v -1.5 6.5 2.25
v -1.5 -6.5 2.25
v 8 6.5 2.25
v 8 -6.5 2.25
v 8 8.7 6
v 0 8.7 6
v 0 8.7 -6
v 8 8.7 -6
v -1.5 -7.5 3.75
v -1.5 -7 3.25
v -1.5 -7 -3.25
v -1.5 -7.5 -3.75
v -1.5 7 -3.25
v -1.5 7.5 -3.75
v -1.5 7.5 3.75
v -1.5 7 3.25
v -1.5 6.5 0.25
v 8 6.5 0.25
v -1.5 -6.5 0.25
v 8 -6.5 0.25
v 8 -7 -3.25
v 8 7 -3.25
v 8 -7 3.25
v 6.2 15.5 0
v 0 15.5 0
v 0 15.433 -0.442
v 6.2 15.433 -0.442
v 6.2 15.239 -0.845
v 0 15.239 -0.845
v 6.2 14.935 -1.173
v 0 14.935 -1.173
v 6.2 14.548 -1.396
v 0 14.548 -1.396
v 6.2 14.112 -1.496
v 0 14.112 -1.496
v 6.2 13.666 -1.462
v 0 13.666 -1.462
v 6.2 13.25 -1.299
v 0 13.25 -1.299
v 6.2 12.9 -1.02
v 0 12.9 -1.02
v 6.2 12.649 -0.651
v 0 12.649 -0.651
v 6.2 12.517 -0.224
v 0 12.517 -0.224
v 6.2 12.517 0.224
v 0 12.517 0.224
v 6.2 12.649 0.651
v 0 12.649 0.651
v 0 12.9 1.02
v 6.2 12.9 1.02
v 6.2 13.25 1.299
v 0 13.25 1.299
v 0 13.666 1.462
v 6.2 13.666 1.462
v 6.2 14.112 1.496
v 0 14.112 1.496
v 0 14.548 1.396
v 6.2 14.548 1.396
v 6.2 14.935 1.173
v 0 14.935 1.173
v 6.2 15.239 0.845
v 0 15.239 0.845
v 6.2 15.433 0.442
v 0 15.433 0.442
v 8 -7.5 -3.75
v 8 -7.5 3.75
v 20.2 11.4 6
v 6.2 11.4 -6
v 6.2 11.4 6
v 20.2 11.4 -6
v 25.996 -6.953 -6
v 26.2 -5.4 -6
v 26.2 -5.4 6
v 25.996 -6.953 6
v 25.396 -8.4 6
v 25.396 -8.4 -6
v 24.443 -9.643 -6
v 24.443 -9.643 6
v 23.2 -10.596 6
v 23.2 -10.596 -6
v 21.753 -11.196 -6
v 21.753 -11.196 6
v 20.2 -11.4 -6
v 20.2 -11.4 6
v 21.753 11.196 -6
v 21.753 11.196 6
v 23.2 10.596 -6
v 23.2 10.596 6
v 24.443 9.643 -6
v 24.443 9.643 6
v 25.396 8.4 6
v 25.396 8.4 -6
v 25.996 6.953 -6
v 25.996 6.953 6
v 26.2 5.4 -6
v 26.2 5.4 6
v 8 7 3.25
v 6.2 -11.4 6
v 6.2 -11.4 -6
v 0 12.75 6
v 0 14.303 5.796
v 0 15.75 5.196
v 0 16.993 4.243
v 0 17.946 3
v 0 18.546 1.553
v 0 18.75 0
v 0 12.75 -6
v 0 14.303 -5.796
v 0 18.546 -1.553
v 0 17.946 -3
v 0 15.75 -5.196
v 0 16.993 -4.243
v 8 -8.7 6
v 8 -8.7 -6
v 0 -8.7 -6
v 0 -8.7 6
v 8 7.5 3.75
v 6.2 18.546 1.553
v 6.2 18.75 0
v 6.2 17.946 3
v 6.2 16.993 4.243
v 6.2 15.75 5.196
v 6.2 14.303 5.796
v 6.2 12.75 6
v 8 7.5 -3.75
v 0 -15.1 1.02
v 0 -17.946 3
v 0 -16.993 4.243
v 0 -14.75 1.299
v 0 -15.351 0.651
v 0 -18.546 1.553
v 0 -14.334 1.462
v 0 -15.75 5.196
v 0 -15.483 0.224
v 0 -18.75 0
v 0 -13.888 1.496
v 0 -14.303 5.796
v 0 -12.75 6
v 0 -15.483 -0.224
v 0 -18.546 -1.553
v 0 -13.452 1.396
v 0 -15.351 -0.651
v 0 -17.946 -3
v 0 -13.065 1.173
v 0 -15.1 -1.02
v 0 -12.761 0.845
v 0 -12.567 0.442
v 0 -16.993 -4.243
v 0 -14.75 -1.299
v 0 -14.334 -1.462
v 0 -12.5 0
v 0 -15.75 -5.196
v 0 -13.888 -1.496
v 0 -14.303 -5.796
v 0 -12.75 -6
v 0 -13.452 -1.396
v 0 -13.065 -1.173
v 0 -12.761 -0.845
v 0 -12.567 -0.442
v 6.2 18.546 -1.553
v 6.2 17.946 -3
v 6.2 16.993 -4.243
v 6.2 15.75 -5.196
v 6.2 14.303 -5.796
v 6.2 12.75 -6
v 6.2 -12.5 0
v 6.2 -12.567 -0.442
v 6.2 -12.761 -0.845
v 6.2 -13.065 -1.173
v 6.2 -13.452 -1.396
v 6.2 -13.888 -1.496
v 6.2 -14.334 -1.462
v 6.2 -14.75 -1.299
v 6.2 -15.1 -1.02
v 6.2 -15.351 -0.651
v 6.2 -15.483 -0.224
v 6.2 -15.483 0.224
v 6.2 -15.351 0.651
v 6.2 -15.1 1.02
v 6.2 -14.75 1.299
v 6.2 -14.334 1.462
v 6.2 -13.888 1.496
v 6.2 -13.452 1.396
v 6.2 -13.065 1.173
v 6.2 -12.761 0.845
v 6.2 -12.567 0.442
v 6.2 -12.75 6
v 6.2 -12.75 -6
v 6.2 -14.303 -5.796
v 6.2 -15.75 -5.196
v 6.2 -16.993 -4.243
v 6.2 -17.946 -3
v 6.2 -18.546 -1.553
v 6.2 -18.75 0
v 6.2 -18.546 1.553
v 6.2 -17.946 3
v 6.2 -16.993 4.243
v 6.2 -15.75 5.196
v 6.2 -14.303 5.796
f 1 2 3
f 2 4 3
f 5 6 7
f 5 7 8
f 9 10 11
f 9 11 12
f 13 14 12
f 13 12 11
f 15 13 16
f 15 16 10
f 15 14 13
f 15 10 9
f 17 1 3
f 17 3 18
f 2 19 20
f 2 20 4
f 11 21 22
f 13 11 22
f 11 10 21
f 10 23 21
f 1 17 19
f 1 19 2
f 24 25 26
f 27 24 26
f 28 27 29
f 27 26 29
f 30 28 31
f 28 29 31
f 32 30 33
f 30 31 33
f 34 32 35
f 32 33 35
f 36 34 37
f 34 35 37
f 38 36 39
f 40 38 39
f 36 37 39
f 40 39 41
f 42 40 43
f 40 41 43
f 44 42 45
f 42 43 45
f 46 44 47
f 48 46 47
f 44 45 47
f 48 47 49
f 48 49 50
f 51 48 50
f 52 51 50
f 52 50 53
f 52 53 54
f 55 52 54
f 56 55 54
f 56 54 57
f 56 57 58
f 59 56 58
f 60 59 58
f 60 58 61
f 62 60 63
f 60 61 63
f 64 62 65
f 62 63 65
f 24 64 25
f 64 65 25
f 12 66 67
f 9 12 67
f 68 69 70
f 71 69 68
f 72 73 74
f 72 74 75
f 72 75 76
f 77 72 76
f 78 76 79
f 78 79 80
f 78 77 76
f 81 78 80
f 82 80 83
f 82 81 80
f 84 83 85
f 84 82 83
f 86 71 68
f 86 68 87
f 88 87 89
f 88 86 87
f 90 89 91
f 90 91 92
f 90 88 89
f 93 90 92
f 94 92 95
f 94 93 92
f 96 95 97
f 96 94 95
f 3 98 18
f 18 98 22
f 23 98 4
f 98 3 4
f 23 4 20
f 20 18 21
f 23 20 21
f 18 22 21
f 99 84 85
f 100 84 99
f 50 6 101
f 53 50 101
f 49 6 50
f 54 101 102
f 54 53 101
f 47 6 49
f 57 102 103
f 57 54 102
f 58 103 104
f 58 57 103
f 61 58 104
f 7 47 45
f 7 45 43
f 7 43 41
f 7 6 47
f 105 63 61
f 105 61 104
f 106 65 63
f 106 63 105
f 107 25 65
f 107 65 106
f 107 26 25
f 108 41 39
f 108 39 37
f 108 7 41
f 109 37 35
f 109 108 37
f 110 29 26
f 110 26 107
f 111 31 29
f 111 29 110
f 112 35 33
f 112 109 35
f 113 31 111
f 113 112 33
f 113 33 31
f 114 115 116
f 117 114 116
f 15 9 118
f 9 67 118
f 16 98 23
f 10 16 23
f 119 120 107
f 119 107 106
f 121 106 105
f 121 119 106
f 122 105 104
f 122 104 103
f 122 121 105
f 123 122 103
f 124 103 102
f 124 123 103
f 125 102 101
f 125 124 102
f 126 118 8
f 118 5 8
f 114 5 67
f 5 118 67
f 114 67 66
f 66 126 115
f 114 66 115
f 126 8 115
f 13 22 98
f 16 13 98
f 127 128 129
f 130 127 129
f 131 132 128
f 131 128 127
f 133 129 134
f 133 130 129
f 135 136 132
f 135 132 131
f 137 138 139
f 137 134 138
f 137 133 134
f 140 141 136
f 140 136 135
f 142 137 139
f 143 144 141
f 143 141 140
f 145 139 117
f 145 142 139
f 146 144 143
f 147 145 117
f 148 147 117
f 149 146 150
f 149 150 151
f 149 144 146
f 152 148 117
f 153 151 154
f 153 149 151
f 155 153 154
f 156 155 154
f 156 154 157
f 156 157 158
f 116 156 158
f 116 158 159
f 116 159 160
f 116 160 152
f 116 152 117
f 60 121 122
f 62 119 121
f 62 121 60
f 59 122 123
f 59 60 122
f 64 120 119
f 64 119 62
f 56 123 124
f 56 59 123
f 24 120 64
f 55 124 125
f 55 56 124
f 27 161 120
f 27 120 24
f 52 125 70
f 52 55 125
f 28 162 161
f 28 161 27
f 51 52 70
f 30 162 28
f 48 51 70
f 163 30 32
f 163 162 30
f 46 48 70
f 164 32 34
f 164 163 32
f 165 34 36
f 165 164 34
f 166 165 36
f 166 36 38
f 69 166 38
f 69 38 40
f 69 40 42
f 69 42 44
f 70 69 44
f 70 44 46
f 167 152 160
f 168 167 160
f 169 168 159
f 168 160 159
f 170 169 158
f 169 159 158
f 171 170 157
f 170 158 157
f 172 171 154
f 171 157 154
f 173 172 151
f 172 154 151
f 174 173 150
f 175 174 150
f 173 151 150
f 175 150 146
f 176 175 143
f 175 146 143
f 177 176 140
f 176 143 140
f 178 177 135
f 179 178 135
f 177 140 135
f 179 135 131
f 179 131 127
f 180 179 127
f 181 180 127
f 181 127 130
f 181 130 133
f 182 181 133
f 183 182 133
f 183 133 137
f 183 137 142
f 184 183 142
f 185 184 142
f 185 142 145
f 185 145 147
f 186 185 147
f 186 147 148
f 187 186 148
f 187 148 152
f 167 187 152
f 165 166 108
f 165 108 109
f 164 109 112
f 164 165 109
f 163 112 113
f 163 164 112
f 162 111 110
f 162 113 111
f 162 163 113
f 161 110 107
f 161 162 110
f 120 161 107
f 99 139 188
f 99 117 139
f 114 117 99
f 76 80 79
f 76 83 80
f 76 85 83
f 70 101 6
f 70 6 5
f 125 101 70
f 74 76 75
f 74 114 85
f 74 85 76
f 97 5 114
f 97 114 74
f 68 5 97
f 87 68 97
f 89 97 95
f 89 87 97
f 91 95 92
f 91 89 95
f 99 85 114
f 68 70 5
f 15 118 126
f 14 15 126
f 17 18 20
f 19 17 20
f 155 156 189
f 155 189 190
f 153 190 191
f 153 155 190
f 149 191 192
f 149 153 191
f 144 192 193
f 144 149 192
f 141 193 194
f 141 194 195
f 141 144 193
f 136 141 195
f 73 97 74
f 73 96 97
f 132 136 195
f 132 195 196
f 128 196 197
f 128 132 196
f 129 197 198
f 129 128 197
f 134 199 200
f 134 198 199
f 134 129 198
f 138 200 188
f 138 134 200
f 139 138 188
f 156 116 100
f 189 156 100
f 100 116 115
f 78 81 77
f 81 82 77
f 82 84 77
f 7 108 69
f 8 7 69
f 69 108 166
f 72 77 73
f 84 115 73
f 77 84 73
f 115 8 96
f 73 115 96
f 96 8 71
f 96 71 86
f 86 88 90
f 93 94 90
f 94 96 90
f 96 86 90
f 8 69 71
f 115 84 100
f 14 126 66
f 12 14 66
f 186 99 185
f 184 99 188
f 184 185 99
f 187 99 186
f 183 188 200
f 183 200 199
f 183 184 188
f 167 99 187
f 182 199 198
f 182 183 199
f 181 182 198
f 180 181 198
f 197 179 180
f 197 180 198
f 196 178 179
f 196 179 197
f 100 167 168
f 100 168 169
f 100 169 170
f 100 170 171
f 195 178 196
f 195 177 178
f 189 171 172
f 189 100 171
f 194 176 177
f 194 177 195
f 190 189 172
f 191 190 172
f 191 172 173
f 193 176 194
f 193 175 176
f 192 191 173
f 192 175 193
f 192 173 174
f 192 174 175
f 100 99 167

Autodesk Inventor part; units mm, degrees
ref_plane "YZ Plane" through (0, 0, 0) normal (1, 0, 0) x (0, 1, 0)
ref_plane "XZ Plane" through (0, 0, 0) normal (0, 1, 0) x (-1, 0, 0)
ref_plane "XY Plane" through (0, 0, 0) normal (0, 0, 1) x (1, 0, 0)
sketch "Sketch1" plane through (0, 0, 0) normal (0, 0, 1) x (1, 0, 0)
  line L0 (0, 18.75) -> (6.2, 18.75)
  line L1 (6.2, -18.75) -> (0, -18.75)
  line L2 (0, -18.75) -> (0, 18.75)
  line L3 (0, 8.7) -> (8, 8.7)
  line L4 (8, 8.7) -> (8, -8.7)
  line L5 (8, -8.7) -> (0, -8.7)
  line L6 (0, -8.7) -> (0, 8.7)
  line L7 (6.2, 11.4) -> (26.2, 11.4)
  line L8 (26.2, 11.4) -> (26.2, -11.4)
  line L9 (26.2, -11.4) -> (6.2, -11.4)
  line L10 (6.2, 18.75) -> (6.2, 11.4)
  line L11 (6.2, -11.4) -> (6.2, -18.75)
  line L12 (6.2, 11.4) -> (6.2, -11.4) construction
  line L13 (0, 0) -> (26.2, 0) construction
  point P0 (6.2, 0)
  dimension "d0" = 37.5
  dimension "d1" = 6.2
  dimension "d2" = 17.4
  dimension "d3" = 8
  dimension "d4" = 20
  dimension "d5" = 22.8
extrude "Extrusion1" add sketch "Sketch1" along normal mid plane 12 contours L0 L10 L7 L8 L9 L11 L1 L2 L5 L4 L3
sketch "Sketch2" plane through (0, 0, 0) normal (1, 0, 0) x (0, 1, 0)
  line L0 (14, 0) -> (-14, 0) construction
  circle A0 centre (14, 0) radius 1.5
  circle A1 centre (-14, 0) radius 1.5
  point P0 (0, 0)
  point P1 (0, 0)
  dimension "d8" = 28
  dimension "d9" = 3
extrude "Extrusion2" cut sketch "Sketch2" along normal through all
sketch "Sketch3" plane through (8, -8.7, -6) normal (-1, 0, 0) x (0, 0, 1)
  line L0 (9.75, 16.2) -> (2.25, 16.2)
  line L1 (2.25, 16.2) -> (2.25, 1.2)
  line L2 (2.25, 1.2) -> (9.75, 1.2)
  line L3 (9.75, 1.2) -> (9.75, 16.2)
  line L4 (9.75, 16.2) -> (2.25, 1.2) construction
  line L5 (2.25, 16.2) -> (9.75, 1.2) construction
  line L6 (2.75, 15.7) -> (9.25, 15.7)
  line L7 (9.25, 15.7) -> (9.25, 1.7)
  line L8 (9.25, 1.7) -> (2.75, 1.7)
  line L9 (2.75, 1.7) -> (2.75, 15.7)
  line L10 (2.75, 15.7) -> (9.25, 1.7) construction
  line L11 (9.25, 15.7) -> (2.75, 1.7) construction
  line L12 (8.25, 15.2) -> (6.25, 15.2)
  line L13 (6.25, 15.2) -> (6.25, 2.2)
  line L14 (6.25, 2.2) -> (8.25, 2.2)
  line L15 (8.25, 2.2) -> (8.25, 15.2)
  line L16 (8.25, 15.2) -> (6.25, 2.2) construction
  line L17 (6.25, 15.2) -> (8.25, 2.2) construction
  line L18 (7.25, 8.7) -> (6, 8.7) construction
  dimension "d12" = 7.5
  dimension "d13" = 15
  dimension "d14" = 0.5
  dimension "d15" = 0.5
  dimension "d16" = 2
  dimension "d17" = 1
  dimension "d18" = 0.5
extrude "Extrusion3" add sketch "Sketch3" along normal blind 9.5
fillet "Fillet1" radius 6 6 edges at (3.1, 18.75, 6) (3.1, 18.75, -6) (3.1, -18.75, 6) (3.1, -18.75, -6) (26.2, -11.4, 0) (26.2, 11.4, 0)
properties part number "panel-usb" material "Rubber"
